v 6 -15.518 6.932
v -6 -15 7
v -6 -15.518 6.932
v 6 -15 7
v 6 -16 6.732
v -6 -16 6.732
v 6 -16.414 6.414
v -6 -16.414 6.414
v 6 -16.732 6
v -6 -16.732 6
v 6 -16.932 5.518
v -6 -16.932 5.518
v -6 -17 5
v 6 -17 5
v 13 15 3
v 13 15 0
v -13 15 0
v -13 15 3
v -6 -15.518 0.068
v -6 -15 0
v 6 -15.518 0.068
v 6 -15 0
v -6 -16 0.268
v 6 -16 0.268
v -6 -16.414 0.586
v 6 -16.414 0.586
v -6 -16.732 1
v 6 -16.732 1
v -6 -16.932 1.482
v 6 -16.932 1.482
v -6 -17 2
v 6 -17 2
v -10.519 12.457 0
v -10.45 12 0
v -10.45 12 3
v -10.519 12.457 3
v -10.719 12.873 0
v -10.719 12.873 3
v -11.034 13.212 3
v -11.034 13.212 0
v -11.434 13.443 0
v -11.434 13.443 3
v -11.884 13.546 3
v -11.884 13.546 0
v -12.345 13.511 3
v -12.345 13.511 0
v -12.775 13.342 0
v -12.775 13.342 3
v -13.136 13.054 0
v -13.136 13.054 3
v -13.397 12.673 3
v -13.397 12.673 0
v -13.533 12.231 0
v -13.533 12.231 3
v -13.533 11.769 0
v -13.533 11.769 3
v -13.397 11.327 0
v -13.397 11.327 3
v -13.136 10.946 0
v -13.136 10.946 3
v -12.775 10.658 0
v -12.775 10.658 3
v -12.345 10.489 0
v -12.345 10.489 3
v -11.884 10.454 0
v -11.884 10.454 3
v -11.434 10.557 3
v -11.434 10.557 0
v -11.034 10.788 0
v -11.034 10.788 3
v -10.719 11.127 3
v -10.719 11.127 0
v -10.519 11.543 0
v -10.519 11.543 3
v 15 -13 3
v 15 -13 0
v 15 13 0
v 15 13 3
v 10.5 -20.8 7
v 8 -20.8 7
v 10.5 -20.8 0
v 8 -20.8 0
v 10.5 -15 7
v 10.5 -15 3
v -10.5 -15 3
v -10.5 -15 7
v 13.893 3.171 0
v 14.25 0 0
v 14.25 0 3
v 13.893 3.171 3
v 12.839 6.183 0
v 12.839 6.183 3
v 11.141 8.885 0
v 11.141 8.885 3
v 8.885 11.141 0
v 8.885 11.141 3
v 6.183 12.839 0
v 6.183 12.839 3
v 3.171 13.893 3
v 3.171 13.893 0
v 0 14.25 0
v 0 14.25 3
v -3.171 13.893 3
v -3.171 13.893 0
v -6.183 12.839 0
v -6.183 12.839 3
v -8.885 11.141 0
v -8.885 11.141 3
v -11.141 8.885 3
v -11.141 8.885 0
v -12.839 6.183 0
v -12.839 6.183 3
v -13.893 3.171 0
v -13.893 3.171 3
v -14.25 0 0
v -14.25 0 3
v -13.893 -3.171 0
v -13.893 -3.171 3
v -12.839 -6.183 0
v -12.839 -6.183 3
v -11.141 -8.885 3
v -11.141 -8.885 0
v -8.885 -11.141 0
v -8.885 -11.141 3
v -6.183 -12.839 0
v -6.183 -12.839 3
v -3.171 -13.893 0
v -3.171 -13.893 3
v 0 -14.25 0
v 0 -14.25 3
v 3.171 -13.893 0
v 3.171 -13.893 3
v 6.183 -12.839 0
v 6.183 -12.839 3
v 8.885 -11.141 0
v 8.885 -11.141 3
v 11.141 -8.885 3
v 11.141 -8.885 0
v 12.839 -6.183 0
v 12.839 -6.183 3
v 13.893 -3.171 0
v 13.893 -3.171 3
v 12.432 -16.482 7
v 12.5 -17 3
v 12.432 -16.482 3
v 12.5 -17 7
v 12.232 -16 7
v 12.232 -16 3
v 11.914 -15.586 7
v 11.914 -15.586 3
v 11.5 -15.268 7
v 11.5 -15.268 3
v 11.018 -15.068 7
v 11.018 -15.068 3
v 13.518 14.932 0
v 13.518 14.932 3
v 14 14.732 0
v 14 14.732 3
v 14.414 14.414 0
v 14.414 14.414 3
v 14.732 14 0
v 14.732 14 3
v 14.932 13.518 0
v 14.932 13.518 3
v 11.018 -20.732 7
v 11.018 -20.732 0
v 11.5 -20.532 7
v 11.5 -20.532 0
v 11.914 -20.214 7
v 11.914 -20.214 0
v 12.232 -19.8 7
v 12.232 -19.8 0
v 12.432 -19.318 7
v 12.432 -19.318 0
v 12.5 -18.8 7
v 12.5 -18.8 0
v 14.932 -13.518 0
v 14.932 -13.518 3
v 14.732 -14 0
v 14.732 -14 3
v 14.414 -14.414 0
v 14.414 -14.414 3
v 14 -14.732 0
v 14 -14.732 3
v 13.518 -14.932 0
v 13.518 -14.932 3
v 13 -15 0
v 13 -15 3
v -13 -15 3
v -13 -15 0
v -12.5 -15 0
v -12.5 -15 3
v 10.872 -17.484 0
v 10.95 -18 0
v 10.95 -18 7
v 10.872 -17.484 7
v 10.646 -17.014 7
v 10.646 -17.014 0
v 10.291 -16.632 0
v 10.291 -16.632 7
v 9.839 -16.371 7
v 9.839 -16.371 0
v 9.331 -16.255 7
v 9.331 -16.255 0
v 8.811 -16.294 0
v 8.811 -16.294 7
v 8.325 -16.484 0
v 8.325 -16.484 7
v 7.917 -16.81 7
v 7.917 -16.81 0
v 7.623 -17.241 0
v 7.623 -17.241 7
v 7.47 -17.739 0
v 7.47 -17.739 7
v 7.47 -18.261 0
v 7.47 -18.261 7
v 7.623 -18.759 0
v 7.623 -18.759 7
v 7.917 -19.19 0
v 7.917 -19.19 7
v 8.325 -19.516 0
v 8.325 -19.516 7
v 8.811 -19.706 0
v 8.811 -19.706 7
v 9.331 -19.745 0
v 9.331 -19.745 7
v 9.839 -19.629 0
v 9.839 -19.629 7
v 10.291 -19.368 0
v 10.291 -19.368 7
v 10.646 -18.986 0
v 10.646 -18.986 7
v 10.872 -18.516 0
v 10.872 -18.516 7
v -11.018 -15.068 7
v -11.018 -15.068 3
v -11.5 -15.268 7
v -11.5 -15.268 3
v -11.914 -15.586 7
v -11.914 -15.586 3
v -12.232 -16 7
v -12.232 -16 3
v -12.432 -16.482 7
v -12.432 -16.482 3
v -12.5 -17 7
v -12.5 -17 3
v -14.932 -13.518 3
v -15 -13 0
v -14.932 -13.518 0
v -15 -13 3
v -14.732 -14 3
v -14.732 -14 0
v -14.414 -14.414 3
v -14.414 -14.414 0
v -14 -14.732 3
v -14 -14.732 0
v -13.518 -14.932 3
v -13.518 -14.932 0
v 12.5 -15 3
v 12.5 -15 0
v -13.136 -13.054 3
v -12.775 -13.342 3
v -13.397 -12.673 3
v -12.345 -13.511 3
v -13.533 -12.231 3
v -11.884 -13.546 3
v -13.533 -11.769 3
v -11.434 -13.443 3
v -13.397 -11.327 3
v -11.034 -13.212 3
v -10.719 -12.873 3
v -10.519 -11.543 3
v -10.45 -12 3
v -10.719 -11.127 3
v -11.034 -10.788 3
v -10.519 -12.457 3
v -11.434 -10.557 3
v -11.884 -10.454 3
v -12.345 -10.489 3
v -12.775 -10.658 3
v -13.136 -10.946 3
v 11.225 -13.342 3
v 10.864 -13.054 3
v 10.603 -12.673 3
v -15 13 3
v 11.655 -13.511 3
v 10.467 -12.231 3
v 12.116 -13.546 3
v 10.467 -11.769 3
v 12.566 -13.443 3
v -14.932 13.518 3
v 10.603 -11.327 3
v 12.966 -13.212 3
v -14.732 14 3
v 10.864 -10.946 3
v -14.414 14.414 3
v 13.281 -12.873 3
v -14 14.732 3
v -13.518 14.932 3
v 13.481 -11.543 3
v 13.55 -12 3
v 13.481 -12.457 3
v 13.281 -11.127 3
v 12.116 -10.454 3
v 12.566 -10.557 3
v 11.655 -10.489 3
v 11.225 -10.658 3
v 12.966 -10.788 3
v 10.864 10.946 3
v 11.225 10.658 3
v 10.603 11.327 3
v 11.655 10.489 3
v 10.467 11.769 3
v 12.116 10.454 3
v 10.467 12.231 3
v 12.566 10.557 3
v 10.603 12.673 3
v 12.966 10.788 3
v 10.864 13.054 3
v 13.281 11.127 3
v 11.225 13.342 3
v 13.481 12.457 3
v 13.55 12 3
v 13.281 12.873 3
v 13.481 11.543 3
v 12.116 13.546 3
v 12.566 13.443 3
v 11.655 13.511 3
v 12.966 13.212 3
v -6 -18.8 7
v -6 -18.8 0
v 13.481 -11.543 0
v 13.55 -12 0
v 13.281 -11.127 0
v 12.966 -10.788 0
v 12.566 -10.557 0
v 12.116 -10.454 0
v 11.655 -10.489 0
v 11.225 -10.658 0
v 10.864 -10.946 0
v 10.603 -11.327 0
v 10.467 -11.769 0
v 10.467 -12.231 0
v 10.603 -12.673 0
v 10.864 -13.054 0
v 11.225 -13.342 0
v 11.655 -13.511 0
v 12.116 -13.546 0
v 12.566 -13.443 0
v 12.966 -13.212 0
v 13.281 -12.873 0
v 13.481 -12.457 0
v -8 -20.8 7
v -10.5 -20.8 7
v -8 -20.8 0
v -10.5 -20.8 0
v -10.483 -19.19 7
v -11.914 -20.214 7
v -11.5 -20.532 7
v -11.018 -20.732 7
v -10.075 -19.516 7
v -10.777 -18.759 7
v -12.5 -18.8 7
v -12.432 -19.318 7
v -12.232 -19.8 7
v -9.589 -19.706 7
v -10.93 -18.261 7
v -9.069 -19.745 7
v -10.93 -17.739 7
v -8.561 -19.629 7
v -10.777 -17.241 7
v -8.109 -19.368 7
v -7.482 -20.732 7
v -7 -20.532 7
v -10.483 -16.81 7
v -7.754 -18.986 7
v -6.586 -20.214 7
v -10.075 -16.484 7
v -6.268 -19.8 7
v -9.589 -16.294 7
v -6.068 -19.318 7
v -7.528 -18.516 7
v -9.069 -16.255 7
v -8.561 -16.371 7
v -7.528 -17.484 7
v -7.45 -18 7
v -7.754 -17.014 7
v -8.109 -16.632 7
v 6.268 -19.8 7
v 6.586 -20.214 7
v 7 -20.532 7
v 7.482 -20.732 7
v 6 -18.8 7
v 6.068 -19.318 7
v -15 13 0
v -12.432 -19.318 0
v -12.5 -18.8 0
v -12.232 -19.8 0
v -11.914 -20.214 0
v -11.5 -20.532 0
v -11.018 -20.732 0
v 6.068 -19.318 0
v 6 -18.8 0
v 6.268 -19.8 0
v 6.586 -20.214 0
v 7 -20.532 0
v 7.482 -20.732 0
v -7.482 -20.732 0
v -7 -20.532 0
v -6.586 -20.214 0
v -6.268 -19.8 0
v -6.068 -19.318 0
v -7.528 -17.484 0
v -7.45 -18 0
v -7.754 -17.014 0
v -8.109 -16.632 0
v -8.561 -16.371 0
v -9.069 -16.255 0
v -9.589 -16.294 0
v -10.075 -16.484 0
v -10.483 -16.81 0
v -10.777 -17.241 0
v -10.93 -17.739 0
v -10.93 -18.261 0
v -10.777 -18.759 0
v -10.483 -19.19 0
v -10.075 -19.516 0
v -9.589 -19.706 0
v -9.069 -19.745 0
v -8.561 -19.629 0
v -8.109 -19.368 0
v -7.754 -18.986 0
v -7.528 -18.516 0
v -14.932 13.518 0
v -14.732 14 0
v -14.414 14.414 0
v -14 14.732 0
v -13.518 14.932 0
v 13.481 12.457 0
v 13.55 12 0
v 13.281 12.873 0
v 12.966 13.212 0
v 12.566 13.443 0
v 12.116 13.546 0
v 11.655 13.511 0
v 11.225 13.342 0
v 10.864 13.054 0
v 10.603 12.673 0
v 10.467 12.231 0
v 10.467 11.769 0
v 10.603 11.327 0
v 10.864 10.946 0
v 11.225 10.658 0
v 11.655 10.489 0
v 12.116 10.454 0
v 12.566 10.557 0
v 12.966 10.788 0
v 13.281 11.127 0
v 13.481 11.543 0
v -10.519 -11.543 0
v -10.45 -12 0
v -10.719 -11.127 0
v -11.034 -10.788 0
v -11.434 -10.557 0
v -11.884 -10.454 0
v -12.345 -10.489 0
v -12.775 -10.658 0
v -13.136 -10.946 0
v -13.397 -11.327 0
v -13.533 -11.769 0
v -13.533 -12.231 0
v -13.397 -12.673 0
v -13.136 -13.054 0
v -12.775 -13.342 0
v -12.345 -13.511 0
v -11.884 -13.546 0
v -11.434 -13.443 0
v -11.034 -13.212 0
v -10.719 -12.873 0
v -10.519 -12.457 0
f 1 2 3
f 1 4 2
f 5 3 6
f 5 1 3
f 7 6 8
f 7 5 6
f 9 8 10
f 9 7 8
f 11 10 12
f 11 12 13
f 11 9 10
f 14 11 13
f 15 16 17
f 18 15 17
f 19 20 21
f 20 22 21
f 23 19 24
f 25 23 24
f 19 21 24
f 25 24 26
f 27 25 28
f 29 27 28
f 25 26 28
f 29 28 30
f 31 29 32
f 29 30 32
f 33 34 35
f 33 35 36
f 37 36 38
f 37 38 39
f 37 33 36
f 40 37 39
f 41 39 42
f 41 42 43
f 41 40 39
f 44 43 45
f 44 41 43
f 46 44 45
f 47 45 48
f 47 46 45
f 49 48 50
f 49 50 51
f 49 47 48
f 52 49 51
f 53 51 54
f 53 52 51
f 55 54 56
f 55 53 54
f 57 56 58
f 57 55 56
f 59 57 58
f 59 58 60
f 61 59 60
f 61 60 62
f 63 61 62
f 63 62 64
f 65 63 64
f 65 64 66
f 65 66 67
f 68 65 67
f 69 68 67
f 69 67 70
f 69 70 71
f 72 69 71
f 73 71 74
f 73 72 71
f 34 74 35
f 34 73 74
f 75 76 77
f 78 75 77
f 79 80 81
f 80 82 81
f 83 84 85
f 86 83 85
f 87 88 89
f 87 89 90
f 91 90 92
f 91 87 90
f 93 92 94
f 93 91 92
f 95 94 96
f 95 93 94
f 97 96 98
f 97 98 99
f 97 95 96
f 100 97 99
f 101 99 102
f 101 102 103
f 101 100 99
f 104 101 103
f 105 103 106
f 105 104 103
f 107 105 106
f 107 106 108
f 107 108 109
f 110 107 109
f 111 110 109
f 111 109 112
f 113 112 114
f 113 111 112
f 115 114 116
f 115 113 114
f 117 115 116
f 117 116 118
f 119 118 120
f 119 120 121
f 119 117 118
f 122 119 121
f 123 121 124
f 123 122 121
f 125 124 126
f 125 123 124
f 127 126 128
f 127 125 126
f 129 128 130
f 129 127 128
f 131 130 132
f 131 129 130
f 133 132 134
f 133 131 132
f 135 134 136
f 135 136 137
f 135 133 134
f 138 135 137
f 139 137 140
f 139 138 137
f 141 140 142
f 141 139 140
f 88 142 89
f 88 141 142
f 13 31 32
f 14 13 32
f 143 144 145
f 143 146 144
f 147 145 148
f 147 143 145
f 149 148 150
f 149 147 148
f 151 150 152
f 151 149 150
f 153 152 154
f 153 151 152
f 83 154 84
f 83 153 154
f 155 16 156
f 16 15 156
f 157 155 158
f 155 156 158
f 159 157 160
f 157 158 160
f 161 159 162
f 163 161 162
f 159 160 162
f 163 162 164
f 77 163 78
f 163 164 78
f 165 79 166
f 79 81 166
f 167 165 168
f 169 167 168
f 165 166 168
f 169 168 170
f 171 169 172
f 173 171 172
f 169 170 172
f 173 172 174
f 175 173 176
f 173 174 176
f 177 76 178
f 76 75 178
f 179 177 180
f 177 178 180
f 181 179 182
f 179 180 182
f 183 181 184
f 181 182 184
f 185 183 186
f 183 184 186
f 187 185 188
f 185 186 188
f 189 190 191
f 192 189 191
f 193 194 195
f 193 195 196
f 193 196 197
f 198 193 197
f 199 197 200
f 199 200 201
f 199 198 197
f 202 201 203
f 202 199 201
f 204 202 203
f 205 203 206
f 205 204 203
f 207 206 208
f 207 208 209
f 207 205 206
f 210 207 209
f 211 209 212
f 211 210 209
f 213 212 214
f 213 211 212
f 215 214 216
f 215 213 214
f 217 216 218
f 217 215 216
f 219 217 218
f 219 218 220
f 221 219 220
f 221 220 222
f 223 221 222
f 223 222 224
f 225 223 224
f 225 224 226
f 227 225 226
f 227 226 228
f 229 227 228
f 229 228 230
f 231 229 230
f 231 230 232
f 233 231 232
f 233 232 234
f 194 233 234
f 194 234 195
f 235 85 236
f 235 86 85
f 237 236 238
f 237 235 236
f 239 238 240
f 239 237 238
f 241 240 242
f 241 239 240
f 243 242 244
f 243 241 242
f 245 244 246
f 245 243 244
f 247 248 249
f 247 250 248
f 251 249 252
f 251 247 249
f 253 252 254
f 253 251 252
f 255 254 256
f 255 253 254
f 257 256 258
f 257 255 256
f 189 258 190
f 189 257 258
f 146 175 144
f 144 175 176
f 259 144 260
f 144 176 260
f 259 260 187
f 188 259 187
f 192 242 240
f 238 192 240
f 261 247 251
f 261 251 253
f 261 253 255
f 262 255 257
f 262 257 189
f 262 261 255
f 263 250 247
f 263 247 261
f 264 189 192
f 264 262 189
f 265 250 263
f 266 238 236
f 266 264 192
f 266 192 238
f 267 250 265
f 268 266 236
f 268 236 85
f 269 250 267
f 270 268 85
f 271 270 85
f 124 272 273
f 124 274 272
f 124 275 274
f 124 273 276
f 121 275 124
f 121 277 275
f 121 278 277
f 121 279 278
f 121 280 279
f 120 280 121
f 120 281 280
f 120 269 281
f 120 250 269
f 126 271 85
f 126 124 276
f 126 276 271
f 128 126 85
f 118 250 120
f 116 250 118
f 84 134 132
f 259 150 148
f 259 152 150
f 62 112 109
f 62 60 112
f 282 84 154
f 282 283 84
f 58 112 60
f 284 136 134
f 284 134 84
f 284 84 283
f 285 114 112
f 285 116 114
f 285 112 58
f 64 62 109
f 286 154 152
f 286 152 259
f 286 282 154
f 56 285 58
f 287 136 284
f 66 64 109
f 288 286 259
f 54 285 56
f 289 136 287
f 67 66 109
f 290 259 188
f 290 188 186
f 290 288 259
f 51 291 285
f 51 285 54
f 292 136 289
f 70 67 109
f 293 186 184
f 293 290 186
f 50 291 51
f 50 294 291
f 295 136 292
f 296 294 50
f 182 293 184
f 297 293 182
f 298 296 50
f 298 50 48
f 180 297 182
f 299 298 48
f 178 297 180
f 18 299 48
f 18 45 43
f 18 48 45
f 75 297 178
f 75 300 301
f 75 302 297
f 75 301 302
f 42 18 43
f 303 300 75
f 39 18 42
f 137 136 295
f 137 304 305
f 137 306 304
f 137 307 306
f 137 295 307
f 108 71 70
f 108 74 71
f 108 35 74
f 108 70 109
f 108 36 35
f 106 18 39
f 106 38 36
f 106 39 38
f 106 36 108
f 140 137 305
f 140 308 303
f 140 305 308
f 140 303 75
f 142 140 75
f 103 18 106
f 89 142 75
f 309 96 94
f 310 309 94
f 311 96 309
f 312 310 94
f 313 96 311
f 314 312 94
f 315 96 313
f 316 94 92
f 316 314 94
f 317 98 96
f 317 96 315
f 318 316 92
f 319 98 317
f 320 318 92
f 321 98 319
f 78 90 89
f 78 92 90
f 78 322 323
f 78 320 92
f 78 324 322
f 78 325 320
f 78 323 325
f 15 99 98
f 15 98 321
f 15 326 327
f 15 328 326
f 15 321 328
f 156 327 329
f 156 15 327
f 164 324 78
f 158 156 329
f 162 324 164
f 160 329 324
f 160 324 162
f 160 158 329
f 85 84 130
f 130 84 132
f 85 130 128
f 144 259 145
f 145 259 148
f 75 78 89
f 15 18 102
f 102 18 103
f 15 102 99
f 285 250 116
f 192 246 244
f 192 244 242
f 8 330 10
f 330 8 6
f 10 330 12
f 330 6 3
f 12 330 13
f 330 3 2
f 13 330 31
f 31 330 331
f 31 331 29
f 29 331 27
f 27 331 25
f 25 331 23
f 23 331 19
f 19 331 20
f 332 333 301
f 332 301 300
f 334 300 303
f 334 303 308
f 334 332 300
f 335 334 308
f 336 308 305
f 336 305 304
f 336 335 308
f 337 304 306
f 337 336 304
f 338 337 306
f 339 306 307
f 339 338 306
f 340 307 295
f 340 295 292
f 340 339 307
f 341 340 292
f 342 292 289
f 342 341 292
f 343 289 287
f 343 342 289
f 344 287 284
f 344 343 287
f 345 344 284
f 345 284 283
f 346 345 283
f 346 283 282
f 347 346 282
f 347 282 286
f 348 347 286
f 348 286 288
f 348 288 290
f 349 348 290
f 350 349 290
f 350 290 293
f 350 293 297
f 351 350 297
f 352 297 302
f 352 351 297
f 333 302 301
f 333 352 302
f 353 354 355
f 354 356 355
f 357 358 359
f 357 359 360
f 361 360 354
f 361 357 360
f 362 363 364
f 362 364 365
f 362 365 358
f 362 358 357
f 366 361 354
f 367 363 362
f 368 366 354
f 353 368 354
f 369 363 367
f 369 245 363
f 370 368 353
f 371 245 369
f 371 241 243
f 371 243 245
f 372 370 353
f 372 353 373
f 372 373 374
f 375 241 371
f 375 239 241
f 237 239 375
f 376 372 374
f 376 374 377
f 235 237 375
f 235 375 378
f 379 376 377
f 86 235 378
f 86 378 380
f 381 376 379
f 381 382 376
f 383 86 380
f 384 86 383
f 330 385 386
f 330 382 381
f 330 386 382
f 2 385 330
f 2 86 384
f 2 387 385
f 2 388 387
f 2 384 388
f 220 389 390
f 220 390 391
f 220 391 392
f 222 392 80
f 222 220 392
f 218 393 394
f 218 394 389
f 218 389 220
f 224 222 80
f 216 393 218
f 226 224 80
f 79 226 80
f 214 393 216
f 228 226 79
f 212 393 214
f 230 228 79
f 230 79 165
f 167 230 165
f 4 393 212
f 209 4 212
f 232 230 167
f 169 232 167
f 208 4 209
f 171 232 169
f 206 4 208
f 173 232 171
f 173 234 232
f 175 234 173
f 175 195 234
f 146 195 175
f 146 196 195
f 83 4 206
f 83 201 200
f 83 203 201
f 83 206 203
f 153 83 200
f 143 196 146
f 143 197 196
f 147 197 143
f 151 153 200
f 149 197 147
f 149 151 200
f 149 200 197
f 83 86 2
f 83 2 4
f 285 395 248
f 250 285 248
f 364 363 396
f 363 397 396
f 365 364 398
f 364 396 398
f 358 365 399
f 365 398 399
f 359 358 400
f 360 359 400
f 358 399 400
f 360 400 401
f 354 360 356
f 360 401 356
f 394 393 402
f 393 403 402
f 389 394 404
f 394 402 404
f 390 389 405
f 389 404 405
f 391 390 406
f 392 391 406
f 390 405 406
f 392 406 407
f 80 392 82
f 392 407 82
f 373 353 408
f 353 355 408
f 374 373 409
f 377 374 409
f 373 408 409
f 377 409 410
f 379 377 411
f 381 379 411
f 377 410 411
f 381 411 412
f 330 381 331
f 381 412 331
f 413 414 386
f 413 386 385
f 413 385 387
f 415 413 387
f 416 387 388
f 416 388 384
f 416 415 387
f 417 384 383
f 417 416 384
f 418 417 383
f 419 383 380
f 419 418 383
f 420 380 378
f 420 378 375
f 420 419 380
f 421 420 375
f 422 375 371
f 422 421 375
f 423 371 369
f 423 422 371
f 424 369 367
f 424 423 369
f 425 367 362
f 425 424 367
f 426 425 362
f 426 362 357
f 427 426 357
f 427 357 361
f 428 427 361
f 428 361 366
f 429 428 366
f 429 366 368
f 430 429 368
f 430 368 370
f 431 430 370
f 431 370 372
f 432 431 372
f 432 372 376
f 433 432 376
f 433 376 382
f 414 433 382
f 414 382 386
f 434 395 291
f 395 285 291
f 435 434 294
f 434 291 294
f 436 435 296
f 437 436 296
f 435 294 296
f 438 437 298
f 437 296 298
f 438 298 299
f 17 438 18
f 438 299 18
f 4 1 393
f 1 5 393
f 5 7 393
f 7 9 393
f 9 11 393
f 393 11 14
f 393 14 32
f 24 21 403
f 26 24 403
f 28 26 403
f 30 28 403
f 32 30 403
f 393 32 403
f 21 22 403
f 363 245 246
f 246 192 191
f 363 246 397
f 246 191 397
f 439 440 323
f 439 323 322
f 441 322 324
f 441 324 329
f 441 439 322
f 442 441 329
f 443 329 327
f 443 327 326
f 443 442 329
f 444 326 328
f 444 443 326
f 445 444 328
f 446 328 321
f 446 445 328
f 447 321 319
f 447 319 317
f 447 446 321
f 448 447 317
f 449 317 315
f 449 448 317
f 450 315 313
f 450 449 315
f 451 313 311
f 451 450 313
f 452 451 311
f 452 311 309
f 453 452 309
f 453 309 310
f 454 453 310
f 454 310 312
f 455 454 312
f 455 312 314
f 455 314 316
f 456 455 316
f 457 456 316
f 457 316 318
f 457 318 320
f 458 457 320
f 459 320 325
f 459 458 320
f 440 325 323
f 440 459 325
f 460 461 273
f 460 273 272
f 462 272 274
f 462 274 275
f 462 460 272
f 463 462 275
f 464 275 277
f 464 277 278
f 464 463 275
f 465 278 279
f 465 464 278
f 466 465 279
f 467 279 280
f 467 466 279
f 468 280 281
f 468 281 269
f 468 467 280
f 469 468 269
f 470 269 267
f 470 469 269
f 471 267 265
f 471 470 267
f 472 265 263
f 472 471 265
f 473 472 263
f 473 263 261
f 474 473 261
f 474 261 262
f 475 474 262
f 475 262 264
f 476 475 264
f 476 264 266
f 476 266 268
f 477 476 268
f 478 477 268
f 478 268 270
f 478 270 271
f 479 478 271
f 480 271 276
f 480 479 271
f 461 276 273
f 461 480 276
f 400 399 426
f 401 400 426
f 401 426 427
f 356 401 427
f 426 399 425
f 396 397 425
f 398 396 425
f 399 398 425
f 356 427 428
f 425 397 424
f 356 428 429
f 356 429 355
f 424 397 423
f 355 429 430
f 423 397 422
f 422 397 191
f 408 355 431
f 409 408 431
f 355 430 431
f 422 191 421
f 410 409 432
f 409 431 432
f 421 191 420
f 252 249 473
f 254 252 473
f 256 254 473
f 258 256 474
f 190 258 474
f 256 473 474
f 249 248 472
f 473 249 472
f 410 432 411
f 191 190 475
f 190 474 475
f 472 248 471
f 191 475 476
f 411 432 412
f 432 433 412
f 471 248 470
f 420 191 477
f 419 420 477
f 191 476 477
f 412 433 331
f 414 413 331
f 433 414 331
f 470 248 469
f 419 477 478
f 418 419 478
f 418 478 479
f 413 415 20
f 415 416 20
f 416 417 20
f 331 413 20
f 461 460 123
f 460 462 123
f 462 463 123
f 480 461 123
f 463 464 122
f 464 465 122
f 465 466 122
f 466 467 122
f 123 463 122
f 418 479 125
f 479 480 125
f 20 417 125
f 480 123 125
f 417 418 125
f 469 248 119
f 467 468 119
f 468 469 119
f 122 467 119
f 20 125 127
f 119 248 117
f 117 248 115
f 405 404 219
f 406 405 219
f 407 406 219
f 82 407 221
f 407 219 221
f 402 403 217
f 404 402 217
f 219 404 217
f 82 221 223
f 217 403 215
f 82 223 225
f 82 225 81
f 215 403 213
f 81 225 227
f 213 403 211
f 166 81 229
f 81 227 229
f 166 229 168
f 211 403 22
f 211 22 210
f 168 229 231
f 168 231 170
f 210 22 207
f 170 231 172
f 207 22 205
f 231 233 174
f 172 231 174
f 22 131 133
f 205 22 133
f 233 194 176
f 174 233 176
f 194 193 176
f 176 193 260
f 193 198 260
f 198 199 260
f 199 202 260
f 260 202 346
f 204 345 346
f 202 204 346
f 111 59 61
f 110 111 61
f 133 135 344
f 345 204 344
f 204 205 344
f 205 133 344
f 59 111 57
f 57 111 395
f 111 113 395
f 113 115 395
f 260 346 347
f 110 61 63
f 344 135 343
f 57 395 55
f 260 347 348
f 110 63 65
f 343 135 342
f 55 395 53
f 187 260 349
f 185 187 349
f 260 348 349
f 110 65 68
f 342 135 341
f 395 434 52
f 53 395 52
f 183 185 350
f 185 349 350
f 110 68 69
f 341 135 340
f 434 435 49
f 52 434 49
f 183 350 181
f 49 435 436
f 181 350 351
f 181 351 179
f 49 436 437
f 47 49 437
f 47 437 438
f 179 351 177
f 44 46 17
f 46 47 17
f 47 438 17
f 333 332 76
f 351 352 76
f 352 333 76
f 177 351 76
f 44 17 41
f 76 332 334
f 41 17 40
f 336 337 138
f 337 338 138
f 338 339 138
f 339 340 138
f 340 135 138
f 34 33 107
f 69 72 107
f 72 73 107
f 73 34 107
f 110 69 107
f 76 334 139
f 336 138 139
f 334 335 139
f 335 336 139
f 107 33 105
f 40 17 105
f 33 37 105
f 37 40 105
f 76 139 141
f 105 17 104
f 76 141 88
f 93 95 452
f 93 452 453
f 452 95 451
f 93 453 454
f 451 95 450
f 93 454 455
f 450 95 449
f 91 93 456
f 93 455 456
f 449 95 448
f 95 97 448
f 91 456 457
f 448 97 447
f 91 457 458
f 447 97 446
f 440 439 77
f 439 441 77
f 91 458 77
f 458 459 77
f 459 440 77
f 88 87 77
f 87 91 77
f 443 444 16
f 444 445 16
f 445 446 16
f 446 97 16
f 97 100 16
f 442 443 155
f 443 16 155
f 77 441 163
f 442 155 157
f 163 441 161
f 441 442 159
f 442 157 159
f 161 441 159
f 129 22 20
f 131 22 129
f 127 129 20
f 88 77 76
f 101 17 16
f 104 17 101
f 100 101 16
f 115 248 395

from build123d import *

# Parameters (mm, degrees)
F0_R     = 1.55
F0_R_2   = 14.25
F0_R_3   = 1.75
F0_W     = 12
F0_H     = 2
F1_DEPTH = 3
F2_DEPTH = 7
F3_R     = 2
F3_R_2   = 1.99999


# Not quite as in the source:
# - a fillet or chamfer is up to 0.001 mm smaller than in the source, because OpenCascade refuses the exact size


with BuildPart() as f1:
    # F0 (on Top) → F1 (new body)
    with BuildSketch(Plane.XY):
        Polygon((12.5, -15), (15, -15), (15, 15), (-15, 15), (-15, -15), (-12.5, -15), (-6, -15), (6, -15), align=None)
        with Locations((-12, -12)):
            Circle(F0_R, mode=Mode.SUBTRACT)
        with Locations((12, -12)):
            Circle(F0_R, mode=Mode.SUBTRACT)
        with Locations((-12, 12)):
            Circle(F0_R, mode=Mode.SUBTRACT)
        Circle(F0_R_2, mode=Mode.SUBTRACT)
        with Locations((12, 12)):
            Circle(F0_R, mode=Mode.SUBTRACT)
        Polygon((-6, -17), (-6, -15), (-12.5, -15), (-12.5, -20.8), (-6, -20.8), align=None)
        with Locations((-9.2, -18)):
            Circle(F0_R_3, mode=Mode.SUBTRACT)
        with Locations((0, -16)):
            Rectangle(F0_W, F0_H)
        Polygon((12.5, -20.8), (12.5, -15), (6, -15), (6, -17), (6, -20.8), align=None)
        with Locations((9.2, -18)):
            Circle(F0_R_3, mode=Mode.SUBTRACT)
    extrude(amount=F1_DEPTH)

    # F0 (on Top) → F2 (join)
    with BuildSketch(Plane.XY):
        with Locations((0, -16)):
            Rectangle(F0_W, F0_H)
        Polygon((-6, -17), (-6, -15), (-12.5, -15), (-12.5, -20.8), (-6, -20.8), align=None)
        with Locations((-9.2, -18)):
            Circle(F0_R_3, mode=Mode.SUBTRACT)
        Polygon((12.5, -20.8), (12.5, -15), (6, -15), (6, -17), (6, -20.8), align=None)
        with Locations((9.2, -18)):
            Circle(F0_R_3, mode=Mode.SUBTRACT)
    extrude(amount=F2_DEPTH)

    # F3 (call 1 of 12: OpenCascade refuses the feature's edges together)
    f3_edges = [f1.edges().sort_by_distance(p)[0] for p in [
        (15, -15, 1.5),
    ]]
    fillet(f3_edges, radius=F3_R)

    # F3#2 (call 2 of 12)
    f3_2_edges = [f1.edges().sort_by_distance(p)[0] for p in [
        (-15, -15, 1.5),
    ]]
    fillet(f3_2_edges, radius=F3_R)

    # F3#3 (call 3 of 12)
    f3_3_edges = [f1.edges().sort_by_distance(p)[0] for p in [
        (-15, 15, 1.5),
    ]]
    fillet(f3_3_edges, radius=F3_R)

    # F3#4 (call 4 of 12)
    f3_4_edges = [f1.edges().sort_by_distance(p)[0] for p in [
        (15, 15, 1.5),
    ]]
    fillet(f3_4_edges, radius=F3_R)

    # F3#5 (call 5 of 12)
    f3_5_edges = [f1.edges().sort_by_distance(p)[0] for p in [
        (-12.5, -20.8, 3.5),
    ]]
    fillet(f3_5_edges, radius=F3_R)

    # F3#6 (call 6 of 12)
    f3_6_edges = [f1.edges().sort_by_distance(p)[0] for p in [
        (-6, -20.8, 3.5),
    ]]
    fillet(f3_6_edges, radius=F3_R)

    # F3#7 (call 7 of 12)
    f3_7_edges = [f1.edges().sort_by_distance(p)[0] for p in [
        (6, -20.8, 3.5),
    ]]
    fillet(f3_7_edges, radius=F3_R)

    # F3#8 (call 8 of 12)
    f3_8_edges = [f1.edges().sort_by_distance(p)[0] for p in [
        (12.5, -20.8, 3.5),
    ]]
    fillet(f3_8_edges, radius=F3_R)

    # F3#9 (call 9 of 12)
    f3_9_edges = [f1.edges().sort_by_distance(p)[0] for p in [
        (12.5, -15, 5),
    ]]
    fillet(f3_9_edges, radius=F3_R)

    # F3#10 (call 10 of 12)
    f3_10_edges = [f1.edges().sort_by_distance(p)[0] for p in [
        (-12.5, -15, 5),
    ]]
    fillet(f3_10_edges, radius=F3_R)

    # F3#11 (call 11 of 12) (radius 2 in the source; OpenCascade refuses exactly that, so slightly less here)
    f3_11_edges = [f1.edges().sort_by_distance(p)[0] for p in [
        (0, -17, 7),
    ]]
    fillet(f3_11_edges, radius=F3_R_2)

    # F3#12 (call 12 of 12)
    f3_12_edges = [f1.edges().sort_by_distance(p)[0] for p in [
        (0, -17, 0),
    ]]
    fillet(f3_12_edges, radius=F3_R)


solid = f1.part
